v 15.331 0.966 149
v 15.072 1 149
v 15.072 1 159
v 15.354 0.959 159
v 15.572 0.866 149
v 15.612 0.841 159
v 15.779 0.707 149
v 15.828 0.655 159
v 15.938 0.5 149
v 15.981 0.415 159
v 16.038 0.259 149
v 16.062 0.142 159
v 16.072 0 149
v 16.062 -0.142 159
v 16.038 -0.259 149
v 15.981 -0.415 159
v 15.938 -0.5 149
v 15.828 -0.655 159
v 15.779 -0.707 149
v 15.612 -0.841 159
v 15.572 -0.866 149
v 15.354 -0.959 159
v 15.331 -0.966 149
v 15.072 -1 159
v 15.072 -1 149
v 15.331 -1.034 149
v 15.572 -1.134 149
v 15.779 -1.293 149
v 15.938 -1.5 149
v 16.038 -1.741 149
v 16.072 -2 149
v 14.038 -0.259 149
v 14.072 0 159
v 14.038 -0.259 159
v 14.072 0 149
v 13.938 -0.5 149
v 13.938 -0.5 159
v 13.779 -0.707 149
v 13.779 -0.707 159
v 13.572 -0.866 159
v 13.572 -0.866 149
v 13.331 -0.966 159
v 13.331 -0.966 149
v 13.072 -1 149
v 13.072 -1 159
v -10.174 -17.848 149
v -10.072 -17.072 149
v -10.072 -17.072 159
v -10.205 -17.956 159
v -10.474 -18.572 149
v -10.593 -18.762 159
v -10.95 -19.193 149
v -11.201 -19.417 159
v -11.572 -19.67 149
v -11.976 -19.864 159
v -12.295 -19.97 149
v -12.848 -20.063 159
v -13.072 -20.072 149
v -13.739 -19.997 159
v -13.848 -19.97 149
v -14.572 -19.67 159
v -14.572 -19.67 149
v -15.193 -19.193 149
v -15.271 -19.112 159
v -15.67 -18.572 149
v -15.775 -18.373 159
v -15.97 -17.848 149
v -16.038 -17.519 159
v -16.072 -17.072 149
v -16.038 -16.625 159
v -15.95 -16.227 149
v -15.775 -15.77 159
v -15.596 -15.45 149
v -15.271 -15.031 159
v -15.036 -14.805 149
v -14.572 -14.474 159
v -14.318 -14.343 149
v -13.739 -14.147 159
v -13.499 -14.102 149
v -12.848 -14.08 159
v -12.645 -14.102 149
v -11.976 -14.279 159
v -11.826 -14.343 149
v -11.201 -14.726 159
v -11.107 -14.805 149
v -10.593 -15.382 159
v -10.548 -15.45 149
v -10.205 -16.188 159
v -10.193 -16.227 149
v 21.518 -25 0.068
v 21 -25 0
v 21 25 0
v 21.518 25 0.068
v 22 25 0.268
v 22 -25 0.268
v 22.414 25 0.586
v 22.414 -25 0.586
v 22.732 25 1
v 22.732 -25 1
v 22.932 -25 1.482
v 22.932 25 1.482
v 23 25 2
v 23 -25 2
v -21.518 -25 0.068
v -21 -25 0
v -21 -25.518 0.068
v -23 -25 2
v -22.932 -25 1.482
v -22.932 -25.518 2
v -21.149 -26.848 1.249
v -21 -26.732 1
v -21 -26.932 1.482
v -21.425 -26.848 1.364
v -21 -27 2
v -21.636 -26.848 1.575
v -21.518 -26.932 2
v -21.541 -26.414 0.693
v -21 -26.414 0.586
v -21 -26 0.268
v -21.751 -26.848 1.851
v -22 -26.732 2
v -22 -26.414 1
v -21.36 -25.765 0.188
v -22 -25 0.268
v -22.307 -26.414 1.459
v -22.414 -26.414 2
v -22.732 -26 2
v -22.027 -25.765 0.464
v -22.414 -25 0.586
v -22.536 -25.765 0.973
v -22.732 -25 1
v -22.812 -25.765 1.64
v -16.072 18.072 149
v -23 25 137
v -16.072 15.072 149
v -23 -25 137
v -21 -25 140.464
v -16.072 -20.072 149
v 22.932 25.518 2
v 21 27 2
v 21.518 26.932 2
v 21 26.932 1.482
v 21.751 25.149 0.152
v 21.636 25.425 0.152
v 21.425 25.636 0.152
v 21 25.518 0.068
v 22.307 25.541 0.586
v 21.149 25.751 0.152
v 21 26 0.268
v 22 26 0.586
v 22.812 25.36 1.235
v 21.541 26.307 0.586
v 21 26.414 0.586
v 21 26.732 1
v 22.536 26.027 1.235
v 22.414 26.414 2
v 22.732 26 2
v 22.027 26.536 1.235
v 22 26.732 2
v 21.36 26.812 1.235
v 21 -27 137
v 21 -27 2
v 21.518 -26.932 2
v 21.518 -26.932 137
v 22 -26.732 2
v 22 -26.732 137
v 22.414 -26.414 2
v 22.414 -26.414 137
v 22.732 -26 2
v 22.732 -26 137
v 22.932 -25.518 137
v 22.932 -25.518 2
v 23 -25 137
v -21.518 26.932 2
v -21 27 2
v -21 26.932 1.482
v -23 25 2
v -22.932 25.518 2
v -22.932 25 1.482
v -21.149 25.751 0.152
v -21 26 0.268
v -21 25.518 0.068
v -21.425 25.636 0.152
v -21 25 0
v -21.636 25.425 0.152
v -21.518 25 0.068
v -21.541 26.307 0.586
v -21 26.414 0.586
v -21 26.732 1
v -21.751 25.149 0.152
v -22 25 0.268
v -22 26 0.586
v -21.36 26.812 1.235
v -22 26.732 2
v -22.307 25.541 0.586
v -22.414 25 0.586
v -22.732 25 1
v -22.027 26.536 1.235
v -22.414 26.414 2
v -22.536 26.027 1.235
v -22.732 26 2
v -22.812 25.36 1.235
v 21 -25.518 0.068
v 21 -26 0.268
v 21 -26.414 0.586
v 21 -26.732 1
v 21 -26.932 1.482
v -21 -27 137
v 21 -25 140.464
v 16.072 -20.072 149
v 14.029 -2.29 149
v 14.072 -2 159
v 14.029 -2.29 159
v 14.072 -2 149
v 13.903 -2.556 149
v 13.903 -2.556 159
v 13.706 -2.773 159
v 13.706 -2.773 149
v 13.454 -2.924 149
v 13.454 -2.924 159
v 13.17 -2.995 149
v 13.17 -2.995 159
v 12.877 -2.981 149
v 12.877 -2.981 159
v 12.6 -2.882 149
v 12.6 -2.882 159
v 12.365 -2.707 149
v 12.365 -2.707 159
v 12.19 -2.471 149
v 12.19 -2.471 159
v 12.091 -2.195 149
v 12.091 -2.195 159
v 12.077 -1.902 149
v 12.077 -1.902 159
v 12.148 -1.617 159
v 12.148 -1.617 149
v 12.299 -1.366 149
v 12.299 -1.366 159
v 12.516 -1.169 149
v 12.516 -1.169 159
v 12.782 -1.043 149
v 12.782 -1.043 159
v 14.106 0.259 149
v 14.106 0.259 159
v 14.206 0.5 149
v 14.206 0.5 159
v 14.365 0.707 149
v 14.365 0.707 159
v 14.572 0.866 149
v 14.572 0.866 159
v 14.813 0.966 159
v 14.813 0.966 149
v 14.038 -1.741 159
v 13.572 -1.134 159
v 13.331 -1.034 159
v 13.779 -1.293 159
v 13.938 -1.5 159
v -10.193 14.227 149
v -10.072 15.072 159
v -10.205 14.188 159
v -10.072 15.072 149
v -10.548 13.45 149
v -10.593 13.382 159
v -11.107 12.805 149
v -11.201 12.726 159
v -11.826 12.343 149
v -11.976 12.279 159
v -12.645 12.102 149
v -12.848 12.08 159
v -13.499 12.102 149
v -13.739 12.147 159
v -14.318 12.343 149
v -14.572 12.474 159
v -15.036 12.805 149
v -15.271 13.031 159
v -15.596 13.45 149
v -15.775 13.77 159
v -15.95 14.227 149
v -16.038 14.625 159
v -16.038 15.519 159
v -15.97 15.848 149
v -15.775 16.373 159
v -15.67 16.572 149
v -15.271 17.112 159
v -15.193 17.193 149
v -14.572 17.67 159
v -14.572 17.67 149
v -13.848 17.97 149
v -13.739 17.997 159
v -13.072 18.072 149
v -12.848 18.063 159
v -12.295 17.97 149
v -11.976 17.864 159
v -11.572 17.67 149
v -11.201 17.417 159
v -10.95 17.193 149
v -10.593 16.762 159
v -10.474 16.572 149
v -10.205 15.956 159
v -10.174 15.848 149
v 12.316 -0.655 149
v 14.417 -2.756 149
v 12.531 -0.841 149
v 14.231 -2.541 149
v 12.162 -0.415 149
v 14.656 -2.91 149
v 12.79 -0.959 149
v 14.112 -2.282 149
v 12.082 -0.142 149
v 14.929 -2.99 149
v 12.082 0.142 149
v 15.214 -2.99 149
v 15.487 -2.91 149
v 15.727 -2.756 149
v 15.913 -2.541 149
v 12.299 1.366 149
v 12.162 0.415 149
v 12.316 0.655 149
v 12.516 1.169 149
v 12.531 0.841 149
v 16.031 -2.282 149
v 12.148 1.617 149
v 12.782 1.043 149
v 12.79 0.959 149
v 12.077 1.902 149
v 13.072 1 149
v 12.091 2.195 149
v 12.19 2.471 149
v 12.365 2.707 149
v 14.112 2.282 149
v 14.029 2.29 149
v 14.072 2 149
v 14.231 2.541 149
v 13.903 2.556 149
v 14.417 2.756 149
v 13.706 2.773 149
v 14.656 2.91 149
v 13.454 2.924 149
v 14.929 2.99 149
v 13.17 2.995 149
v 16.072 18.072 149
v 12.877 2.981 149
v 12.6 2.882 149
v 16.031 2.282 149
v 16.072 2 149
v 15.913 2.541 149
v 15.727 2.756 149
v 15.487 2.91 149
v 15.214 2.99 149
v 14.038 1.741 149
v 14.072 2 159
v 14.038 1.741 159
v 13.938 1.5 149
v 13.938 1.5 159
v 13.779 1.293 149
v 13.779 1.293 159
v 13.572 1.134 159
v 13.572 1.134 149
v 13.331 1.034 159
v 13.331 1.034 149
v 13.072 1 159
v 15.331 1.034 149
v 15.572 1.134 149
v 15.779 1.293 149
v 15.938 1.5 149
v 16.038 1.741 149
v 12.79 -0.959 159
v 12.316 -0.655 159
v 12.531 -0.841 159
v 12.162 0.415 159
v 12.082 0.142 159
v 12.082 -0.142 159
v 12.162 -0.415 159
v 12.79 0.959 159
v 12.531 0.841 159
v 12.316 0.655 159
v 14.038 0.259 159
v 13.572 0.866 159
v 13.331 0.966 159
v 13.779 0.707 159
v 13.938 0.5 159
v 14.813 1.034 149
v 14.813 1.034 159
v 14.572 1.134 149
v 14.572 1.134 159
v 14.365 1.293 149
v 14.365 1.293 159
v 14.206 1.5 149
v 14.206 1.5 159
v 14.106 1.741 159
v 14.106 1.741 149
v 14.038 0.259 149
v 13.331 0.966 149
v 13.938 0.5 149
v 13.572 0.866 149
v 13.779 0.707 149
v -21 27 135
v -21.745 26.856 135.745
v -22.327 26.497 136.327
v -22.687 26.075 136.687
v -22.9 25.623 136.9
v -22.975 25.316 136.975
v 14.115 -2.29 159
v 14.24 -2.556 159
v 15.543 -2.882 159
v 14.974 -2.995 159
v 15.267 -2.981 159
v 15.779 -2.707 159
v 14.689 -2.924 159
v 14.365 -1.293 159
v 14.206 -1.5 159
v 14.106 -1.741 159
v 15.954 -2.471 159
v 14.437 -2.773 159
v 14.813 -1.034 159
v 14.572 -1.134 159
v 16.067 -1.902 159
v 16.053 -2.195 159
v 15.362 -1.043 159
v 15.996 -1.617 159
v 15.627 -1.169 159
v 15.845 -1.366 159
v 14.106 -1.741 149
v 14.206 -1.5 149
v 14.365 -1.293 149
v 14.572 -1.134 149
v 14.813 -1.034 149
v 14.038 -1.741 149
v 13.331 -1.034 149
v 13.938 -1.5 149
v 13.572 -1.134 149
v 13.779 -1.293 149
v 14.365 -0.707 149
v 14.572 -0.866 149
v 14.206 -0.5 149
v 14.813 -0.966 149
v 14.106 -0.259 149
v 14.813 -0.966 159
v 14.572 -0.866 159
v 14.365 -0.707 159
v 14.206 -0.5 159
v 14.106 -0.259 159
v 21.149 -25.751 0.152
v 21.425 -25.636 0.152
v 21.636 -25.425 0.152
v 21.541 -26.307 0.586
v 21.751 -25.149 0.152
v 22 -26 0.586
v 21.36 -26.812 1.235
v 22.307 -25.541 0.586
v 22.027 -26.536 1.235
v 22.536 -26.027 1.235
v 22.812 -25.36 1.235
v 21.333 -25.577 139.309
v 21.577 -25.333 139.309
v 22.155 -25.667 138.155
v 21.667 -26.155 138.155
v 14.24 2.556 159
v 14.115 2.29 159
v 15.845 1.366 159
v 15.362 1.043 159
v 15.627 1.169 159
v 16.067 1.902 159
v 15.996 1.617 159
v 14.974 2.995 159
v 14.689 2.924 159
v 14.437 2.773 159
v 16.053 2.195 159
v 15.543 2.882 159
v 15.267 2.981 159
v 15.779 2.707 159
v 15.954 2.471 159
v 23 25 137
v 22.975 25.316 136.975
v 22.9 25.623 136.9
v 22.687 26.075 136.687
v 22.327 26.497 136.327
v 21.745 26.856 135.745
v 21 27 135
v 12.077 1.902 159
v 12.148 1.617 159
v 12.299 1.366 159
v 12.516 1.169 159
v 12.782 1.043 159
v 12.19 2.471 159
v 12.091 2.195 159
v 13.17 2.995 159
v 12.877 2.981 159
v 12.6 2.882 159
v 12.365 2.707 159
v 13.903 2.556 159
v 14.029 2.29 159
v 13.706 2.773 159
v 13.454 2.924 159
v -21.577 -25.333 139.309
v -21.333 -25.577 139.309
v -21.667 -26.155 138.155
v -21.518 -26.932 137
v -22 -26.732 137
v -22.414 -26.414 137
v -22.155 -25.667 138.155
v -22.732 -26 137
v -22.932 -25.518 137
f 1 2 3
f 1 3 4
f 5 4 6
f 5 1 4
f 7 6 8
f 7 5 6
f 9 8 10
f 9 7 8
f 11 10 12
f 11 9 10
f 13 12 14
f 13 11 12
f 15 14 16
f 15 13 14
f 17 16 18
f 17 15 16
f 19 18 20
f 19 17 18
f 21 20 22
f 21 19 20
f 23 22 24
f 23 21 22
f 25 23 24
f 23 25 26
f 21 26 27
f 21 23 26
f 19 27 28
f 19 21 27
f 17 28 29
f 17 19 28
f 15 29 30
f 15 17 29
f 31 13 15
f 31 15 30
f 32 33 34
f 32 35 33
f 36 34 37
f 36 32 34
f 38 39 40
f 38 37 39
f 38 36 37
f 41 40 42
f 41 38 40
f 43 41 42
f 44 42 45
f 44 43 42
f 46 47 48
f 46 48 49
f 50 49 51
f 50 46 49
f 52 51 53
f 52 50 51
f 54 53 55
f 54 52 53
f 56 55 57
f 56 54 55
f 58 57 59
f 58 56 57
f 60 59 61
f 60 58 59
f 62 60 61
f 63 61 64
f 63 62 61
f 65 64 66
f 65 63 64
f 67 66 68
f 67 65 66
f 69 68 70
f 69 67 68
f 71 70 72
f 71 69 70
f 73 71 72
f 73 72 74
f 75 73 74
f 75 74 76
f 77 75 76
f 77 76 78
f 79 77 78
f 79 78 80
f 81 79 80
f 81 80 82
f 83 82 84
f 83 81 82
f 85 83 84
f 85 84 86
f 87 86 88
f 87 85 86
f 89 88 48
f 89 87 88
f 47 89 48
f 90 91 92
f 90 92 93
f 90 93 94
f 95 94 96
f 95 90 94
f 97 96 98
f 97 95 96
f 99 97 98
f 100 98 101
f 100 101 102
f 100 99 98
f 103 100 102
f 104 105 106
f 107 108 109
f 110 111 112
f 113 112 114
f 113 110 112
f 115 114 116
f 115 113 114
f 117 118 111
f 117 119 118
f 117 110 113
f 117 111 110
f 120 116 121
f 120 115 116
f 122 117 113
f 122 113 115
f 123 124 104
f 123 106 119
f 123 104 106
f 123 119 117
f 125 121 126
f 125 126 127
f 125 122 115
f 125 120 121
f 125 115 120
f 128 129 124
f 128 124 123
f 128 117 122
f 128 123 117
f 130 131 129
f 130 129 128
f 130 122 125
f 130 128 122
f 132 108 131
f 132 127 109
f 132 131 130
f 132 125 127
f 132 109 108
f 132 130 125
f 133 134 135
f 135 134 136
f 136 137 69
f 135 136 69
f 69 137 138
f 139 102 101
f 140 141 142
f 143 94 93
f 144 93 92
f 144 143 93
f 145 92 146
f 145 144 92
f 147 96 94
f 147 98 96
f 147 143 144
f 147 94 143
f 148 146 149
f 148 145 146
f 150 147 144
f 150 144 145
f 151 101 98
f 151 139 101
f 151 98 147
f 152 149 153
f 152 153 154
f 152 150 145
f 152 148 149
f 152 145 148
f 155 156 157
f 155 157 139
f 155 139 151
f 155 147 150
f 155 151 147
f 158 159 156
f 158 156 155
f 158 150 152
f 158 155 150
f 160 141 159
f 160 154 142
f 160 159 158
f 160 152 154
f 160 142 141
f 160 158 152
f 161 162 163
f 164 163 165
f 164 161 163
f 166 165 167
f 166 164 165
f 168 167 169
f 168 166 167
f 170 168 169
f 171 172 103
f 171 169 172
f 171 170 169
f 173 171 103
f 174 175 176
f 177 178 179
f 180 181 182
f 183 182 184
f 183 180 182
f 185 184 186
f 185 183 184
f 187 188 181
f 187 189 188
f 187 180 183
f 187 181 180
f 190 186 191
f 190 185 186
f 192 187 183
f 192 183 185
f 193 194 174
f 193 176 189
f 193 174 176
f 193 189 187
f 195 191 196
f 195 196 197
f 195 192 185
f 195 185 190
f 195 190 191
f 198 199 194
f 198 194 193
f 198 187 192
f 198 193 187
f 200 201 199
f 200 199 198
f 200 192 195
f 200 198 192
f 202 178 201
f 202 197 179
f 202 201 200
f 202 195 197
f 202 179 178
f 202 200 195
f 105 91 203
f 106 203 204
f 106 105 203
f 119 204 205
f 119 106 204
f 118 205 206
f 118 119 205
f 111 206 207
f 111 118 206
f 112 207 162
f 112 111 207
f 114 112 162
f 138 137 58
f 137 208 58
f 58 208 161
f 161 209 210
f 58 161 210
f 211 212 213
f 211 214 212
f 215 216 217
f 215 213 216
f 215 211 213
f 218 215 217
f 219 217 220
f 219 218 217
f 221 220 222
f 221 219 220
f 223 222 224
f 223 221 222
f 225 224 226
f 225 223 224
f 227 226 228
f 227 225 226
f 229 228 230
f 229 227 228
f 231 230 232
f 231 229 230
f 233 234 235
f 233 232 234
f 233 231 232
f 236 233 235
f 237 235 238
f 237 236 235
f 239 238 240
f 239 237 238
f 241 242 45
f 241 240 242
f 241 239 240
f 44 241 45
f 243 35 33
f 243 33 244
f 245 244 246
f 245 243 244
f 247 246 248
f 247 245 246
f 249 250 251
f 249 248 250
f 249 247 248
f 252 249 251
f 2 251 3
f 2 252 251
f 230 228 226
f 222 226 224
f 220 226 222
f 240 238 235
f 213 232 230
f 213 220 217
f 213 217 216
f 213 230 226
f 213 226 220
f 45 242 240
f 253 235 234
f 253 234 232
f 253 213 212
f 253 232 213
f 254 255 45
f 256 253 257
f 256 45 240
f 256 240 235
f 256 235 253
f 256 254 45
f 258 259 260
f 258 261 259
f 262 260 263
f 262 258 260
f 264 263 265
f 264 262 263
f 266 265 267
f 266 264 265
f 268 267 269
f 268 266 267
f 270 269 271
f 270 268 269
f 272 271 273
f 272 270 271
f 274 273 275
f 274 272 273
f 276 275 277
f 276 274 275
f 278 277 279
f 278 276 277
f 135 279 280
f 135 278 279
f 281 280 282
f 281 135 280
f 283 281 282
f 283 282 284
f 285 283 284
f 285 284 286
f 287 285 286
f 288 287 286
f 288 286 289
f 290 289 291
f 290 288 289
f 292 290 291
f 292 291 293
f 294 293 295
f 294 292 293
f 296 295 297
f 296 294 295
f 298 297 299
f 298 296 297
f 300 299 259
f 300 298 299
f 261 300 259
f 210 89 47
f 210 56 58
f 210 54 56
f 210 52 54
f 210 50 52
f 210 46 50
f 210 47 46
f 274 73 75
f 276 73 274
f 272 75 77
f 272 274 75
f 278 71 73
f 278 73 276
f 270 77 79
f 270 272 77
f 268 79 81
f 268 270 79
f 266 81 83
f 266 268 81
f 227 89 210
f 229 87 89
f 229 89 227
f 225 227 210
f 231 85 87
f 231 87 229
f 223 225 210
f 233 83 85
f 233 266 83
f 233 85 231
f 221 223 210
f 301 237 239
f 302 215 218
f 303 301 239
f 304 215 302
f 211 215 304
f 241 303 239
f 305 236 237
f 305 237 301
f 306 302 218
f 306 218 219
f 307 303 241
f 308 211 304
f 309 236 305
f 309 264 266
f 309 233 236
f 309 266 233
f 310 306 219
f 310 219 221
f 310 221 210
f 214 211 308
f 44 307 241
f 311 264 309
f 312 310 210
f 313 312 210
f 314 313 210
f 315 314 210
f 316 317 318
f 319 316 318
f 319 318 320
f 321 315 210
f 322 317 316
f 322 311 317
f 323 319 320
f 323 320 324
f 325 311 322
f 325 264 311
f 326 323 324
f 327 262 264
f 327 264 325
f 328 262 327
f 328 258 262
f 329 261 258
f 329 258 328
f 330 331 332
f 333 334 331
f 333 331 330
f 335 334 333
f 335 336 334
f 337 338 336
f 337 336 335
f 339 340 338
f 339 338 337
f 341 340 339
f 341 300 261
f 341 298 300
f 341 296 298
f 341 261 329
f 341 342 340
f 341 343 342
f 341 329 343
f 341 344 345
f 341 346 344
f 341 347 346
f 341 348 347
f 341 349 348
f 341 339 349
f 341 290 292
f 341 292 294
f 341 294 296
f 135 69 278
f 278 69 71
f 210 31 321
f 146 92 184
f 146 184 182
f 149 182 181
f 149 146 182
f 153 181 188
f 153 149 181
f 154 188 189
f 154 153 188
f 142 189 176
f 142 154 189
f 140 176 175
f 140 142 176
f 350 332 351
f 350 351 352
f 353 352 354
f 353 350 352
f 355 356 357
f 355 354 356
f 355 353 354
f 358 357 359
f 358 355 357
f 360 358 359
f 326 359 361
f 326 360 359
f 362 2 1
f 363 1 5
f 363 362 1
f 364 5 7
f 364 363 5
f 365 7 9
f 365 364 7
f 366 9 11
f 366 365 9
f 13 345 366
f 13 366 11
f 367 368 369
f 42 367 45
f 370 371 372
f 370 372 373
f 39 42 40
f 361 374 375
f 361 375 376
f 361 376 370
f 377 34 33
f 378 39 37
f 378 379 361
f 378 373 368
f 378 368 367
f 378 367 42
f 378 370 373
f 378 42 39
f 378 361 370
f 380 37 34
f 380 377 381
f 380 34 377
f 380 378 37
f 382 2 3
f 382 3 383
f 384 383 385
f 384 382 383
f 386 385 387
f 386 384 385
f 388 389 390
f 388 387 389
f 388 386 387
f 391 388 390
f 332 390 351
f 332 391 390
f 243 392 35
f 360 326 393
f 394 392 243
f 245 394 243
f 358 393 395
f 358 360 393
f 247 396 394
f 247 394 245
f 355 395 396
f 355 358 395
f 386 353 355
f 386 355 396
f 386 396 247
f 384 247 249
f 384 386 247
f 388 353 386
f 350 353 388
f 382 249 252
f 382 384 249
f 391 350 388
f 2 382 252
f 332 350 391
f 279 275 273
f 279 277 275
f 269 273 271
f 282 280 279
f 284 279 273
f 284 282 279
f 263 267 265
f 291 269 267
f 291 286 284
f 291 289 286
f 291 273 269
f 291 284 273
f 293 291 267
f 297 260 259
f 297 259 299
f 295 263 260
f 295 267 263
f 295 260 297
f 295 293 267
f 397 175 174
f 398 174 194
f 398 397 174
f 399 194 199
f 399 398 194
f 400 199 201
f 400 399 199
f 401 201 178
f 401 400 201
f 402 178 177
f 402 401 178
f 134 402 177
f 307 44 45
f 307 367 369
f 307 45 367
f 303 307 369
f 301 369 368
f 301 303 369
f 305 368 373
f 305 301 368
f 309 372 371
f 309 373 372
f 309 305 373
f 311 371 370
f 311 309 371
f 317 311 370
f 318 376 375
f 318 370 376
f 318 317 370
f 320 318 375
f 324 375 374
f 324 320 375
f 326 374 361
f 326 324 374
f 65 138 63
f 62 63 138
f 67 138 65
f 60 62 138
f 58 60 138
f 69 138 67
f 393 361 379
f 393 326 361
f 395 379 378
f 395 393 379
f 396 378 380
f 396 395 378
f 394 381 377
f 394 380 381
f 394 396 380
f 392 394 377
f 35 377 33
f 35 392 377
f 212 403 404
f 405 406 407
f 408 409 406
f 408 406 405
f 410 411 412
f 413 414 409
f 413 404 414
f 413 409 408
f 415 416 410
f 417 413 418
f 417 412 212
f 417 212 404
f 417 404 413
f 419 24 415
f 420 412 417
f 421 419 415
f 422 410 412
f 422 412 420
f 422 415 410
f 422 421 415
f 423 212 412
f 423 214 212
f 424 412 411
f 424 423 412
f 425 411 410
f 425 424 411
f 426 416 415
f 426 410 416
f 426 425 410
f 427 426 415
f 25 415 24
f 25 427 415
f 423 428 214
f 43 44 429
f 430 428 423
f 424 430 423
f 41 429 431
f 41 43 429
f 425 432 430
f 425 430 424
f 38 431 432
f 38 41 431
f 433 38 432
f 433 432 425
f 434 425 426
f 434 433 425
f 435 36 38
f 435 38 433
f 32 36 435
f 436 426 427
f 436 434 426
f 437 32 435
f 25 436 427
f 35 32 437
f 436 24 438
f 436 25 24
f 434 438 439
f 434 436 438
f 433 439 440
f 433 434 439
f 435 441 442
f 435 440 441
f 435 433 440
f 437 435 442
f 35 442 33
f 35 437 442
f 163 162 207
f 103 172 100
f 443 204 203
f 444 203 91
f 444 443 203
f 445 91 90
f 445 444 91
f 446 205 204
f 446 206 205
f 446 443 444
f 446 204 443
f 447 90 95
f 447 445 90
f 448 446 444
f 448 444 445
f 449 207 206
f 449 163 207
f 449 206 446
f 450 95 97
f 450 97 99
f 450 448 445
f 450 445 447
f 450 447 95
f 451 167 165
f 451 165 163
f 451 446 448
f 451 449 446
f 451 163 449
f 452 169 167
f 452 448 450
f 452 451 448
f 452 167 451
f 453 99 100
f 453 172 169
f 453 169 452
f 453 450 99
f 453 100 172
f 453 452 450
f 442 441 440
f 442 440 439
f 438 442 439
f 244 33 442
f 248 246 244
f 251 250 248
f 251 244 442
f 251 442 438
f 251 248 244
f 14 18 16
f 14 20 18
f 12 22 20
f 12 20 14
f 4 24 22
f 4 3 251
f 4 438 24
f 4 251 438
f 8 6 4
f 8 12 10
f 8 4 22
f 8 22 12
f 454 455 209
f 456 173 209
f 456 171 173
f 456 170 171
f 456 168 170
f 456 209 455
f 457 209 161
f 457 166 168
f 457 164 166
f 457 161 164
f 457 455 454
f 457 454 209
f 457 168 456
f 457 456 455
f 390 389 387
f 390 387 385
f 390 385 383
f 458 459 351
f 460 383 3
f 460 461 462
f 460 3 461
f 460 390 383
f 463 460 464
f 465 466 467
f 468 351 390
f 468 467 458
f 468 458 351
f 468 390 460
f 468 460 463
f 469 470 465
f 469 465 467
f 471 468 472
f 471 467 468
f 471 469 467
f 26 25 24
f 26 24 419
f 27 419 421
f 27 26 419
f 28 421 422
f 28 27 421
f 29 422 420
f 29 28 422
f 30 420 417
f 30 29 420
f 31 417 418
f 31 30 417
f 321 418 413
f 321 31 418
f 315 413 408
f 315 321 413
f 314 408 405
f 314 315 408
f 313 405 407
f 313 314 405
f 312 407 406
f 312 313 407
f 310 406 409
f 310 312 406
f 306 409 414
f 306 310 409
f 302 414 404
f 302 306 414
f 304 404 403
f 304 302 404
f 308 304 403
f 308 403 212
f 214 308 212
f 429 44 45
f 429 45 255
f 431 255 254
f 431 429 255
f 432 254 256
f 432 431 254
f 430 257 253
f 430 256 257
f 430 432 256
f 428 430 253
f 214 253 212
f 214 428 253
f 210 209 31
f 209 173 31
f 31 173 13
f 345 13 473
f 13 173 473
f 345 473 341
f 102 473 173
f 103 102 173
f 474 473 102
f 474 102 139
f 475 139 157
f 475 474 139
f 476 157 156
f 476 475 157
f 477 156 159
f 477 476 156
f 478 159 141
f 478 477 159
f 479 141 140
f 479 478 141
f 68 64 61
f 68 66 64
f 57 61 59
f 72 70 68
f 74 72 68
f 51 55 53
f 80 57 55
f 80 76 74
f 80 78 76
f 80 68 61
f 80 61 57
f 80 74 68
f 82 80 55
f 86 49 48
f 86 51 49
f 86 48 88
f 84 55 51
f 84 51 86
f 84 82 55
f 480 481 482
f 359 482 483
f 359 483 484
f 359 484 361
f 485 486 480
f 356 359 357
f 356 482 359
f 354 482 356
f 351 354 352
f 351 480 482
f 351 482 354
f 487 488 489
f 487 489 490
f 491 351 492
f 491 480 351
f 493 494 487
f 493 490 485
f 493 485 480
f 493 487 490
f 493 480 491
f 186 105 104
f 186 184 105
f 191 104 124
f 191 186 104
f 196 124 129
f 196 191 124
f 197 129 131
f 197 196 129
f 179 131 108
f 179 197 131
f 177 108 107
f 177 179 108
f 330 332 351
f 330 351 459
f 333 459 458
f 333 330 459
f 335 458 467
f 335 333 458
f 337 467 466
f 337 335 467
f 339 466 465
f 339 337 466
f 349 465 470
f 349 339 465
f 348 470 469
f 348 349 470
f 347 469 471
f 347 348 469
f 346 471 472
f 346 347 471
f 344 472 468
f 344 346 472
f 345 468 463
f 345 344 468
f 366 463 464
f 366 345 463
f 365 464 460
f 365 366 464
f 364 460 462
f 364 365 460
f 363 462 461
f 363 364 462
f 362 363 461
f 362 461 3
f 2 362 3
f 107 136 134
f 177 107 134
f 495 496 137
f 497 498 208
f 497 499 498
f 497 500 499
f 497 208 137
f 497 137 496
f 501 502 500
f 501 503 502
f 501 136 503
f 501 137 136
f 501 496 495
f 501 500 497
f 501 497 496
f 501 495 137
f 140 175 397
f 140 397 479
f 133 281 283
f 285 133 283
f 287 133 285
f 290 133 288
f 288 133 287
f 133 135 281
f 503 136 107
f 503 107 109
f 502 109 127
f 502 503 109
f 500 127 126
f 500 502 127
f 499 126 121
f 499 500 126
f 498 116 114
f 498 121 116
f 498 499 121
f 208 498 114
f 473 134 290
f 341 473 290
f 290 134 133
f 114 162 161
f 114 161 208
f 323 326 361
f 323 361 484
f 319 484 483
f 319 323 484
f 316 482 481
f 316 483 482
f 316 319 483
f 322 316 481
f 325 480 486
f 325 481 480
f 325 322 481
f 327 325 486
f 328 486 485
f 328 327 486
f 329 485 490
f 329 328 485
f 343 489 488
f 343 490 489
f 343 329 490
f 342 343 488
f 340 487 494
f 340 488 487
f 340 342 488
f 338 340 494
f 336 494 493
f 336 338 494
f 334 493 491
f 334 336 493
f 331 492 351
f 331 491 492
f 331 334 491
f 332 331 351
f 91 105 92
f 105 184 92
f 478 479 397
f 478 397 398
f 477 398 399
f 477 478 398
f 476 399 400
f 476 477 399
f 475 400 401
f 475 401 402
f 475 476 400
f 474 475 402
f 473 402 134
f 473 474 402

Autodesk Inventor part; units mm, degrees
ref_plane "YZ Plane" through (0, 0, 0) normal (1, 0, 0) x (0, 1, 0)
ref_plane "XZ Plane" through (0, 0, 0) normal (0, 1, 0) x (-1, 0, 0)
ref_plane "XY Plane" through (0, 0, 0) normal (0, 0, 1) x (1, 0, 0)
sketch "Sketch1" plane through (0, 0, 0) normal (0, 0, 1) x (1, 0, 0)
  line L0 (-23, 27) -> (23, 27)
  line L1 (23, 27) -> (23, -27)
  line L2 (23, -27) -> (-23, -27)
  line L3 (-23, -27) -> (-23, 27)
  line L4 (-23, 27) -> (23, -27) construction
  line L5 (23, 27) -> (-23, -27) construction
  point P0 (0, 0)
  dimension "d0" = 46
  dimension "d1" = 54
extrude "Extrusion1" add sketch "Sketch1" along normal blind 137
fillet "Fillet1" radius 2 9 edges at (-23, 27, 68.5) (0, 27, 137) (23, 27, 68.5) (0, 27, 0) (23, -27, 68.5) (23, 0, 0) (-23, 0, 0) (-23, -27, 68.5) (0, -27, 0)
sketch "Sketch2" plane through (-23, 27, 0) normal (0, 1, 0) x (1, 0, 0)
  line L0 (2, -131.2678) -> (2, -4.2112) construction
  line L1 (2, -4.2112) -> (44, -4.2112) construction
  line L2 (44, -4.2112) -> (44, -131.2678) construction
  line L3 (44, -131.2678) -> (2, -131.2678) construction
  line L4 (2, -135) -> (2, -2) projected
  line L5 (44, -2) -> (44, -135) projected
  point P0 (23, 0)
sketch "Sketch3" plane through (0, 0, 137) normal (0, 0, 1) x (1, 0, 0)
  arc A0 (-23, -25) -> (-21, -27) centre (-21, -25) ccw projected
  line L0 (-21, -27) -> (21, -27) projected
  arc A1 (21, -27) -> (23, -25) centre (21, -25) ccw projected
  line L1 (23, -25) -> (23, 25) projected
  line L2 (-23, 25) -> (23, 25) projected
  line L3 (-23, 25) -> (-23, -25) projected
  point P0 (0, 0)
extrude "Extrusion2" add sketch "Sketch3" along normal blind 12 draft -30
sketch "Sketch4" plane through (0, 0, 149) normal (0, 0, 1) x (1, 0, 0)
  circle A0 centre (-13.0718, 15.0718) radius 3
  circle A1 centre (-13.0718, -17.0718) radius 3
  line L0 (-16.0718, 18.0718) -> (16.0718, 18.0718) projected
  line L1 (-16.0718, -20.0718) -> (-16.0718, 18.0718) projected
  line L2 (16.0718, 18.0718) -> (16.0718, -20.0718) projected
  circle A2 centre (13.0718, 0) radius 1
  circle A3 centre (15.0718, 0) radius 1
  circle A4 centre (15.0718, 2) radius 1
  circle A5 centre (13.0718, 2) radius 1
  line L3 (16.0718, -20.0718) -> (-16.0718, -20.0718) projected
  circle A6 centre (13.0718, -2) radius 1
  circle A7 centre (15.0718, -2) radius 1
  line L4 (0, 0) -> (13.0718, 0) construction
  point P0 (13.0718, 1)
  point P1 (14.0718, 2)
  point P2 (15.0718, 1)
  point P3 (14.0718, 0)
  point P4 (14.0718, -2)
  dimension "d45" = 6
  dimension "d46" = 6
  dimension "d48" = 2
extrude "Extrusion3" add sketch "Sketch4" along normal blind 10 contours A0 | A1 | A4 | A3 | A5 | A7 | A2 | A6
properties part number "Lipo Battery CNHL 4000mAh"
